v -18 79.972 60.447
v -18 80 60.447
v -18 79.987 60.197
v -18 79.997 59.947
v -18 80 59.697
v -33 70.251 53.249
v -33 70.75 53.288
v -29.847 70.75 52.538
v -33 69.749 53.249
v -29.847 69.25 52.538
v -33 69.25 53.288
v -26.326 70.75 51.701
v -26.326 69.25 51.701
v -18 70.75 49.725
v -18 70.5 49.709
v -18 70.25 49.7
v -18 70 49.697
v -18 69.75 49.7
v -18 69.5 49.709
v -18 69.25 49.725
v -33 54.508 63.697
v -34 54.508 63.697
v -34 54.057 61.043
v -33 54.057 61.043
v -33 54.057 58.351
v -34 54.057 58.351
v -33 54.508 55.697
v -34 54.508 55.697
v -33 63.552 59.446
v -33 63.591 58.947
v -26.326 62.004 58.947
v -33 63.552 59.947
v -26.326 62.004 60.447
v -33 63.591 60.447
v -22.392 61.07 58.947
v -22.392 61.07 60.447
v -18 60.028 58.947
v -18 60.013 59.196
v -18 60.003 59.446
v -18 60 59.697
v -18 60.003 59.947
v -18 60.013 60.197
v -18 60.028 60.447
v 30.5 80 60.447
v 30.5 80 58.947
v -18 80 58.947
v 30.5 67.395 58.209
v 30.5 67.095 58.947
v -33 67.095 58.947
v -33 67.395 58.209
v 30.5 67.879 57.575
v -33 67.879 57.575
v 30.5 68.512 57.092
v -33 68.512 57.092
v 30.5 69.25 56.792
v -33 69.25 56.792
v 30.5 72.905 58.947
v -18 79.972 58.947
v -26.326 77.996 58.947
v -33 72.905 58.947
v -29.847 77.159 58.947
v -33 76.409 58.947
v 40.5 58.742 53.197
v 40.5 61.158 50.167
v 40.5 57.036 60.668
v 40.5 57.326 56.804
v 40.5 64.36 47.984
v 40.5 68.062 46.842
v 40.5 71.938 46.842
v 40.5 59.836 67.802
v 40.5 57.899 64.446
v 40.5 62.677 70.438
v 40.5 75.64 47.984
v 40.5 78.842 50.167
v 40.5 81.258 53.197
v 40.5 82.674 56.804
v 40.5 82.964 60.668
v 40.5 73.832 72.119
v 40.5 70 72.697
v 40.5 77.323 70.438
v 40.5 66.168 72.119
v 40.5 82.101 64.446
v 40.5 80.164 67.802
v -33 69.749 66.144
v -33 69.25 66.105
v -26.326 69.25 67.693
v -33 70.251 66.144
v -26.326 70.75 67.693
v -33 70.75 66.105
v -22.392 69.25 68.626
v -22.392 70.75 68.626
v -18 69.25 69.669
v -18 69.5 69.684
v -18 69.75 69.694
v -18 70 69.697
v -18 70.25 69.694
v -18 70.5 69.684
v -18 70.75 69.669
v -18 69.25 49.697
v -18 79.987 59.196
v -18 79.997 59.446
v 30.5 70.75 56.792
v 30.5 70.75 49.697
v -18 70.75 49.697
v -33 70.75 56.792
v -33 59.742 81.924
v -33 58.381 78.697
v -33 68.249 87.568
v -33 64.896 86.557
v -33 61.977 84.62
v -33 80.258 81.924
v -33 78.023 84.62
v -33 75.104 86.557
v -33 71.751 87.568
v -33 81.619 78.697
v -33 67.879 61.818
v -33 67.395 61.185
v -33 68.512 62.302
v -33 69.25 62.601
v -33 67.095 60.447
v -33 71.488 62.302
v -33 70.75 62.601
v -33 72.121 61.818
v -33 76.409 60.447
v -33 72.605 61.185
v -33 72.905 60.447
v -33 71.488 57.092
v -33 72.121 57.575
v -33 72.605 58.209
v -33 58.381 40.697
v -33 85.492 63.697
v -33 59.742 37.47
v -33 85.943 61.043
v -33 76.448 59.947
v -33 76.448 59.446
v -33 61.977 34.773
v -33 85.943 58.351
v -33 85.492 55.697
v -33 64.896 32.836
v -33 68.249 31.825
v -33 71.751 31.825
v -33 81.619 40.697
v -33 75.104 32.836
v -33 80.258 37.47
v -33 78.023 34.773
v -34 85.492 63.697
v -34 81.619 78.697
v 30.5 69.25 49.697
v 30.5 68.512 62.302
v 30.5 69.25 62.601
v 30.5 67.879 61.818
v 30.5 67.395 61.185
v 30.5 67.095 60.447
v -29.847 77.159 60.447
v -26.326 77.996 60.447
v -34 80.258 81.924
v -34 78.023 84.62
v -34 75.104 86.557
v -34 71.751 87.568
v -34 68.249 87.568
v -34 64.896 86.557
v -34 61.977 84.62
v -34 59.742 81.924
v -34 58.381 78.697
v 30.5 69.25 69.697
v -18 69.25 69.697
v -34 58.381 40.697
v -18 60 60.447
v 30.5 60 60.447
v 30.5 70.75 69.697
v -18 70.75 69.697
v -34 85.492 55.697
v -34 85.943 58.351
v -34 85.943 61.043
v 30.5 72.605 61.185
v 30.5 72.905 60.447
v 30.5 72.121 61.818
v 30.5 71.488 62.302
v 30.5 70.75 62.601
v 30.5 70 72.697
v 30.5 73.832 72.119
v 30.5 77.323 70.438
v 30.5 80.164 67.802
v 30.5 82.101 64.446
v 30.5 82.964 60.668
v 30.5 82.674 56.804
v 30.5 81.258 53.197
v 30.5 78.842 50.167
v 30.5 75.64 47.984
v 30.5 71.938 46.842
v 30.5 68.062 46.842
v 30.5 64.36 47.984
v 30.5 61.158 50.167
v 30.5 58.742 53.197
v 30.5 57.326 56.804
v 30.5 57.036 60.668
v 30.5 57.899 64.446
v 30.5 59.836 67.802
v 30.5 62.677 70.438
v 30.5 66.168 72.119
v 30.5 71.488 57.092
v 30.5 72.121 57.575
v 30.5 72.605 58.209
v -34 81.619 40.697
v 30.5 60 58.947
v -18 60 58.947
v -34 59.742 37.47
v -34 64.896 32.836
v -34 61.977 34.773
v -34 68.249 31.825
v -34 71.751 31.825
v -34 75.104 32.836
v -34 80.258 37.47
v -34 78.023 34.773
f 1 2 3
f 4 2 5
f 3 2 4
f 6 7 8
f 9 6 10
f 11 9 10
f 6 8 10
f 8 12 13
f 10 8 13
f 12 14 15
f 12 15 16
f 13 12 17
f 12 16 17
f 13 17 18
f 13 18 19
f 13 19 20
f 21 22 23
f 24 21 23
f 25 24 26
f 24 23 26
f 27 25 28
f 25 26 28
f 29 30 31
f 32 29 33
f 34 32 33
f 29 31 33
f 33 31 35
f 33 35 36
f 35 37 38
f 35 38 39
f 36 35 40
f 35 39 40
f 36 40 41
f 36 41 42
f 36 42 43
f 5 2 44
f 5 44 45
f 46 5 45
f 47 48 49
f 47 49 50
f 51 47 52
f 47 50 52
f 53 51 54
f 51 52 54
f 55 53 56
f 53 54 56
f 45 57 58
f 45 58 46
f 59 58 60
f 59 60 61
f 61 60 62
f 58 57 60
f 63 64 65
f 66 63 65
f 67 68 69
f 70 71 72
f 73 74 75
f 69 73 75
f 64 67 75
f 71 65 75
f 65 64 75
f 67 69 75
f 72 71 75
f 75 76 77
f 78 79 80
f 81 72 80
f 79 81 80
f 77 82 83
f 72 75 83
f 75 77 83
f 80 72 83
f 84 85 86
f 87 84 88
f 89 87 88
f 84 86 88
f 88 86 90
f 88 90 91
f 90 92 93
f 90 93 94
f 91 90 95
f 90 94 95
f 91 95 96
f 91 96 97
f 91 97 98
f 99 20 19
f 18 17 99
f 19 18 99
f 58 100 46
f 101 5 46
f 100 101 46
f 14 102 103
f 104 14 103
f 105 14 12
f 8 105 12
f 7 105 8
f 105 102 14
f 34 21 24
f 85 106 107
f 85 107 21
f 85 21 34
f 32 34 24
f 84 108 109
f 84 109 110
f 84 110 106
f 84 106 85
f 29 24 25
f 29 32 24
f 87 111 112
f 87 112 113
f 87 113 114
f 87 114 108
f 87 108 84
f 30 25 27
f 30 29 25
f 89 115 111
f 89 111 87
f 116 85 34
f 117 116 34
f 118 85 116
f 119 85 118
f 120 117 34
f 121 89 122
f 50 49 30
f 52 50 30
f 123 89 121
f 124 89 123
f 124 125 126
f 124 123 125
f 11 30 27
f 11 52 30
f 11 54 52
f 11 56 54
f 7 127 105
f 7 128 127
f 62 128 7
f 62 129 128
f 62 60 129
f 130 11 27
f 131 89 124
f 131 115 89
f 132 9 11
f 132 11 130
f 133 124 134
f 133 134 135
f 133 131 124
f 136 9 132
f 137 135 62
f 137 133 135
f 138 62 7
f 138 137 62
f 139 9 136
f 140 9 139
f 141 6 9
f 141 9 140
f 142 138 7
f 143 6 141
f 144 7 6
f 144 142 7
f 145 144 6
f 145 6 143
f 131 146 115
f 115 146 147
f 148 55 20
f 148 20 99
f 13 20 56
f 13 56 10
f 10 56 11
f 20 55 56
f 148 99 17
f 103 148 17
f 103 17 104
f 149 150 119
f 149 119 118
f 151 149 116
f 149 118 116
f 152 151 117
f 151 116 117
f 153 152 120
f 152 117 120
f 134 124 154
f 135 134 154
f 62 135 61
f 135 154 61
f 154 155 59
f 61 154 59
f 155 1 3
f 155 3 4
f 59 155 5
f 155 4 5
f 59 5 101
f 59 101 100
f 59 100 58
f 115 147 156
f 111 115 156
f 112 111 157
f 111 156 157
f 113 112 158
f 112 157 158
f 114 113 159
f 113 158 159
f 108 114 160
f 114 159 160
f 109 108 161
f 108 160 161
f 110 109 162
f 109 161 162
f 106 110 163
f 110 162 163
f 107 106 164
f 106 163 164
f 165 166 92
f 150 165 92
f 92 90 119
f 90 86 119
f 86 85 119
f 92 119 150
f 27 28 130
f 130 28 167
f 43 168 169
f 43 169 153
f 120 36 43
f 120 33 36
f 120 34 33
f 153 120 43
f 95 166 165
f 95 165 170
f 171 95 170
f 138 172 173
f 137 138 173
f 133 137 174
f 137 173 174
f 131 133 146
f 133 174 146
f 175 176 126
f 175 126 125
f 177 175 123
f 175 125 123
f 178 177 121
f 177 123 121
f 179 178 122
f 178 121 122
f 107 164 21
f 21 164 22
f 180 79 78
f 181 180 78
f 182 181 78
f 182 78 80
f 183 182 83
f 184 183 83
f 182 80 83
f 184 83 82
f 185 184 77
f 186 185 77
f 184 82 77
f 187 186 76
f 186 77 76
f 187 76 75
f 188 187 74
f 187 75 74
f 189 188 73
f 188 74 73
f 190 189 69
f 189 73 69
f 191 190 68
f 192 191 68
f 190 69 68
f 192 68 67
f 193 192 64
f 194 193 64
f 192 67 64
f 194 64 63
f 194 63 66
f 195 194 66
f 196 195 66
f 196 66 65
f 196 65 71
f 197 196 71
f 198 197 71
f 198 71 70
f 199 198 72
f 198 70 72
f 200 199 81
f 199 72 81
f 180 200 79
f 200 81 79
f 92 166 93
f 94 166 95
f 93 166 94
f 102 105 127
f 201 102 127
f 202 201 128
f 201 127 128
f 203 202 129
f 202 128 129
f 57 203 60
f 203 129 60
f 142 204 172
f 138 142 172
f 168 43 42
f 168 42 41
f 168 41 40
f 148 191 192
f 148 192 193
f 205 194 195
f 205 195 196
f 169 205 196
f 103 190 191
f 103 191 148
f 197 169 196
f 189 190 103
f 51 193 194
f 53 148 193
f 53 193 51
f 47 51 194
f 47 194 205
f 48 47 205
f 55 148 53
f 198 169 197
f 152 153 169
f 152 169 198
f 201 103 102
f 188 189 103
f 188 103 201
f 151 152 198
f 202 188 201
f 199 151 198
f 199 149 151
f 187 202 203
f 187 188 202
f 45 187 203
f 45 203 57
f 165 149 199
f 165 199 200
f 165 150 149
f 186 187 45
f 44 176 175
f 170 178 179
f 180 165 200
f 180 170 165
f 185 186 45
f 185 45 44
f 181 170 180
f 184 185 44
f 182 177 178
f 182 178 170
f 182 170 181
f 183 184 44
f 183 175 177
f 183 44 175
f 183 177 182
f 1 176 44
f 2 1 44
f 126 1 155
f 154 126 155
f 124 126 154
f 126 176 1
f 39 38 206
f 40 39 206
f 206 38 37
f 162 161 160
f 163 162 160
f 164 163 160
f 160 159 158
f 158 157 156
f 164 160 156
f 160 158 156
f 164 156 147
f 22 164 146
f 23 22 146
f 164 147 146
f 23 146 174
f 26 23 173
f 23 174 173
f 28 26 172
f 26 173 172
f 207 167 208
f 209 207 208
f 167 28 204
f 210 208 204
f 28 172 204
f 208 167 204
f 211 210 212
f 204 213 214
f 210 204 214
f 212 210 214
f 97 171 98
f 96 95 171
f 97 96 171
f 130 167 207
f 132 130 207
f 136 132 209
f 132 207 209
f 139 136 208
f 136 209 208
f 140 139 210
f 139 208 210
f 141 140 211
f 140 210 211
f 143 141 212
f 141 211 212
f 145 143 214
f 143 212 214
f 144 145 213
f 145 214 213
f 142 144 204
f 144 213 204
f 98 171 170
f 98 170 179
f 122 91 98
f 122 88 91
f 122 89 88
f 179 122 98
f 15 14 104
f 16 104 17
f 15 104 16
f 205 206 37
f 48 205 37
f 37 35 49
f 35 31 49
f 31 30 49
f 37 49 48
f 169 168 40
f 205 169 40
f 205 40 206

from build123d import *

# Parameters (mm, degrees)
BOSS_EXTRUDE1_DEPTH      = 90
FILLET1_R                = 7.5
FILLET2_R                = 2
SKETCH2_W                = 20
SKETCH2_H                = 80
SKETCH2_W_2              = 32
BOSS_EXTRUDE2_DEPTH      = 20
SKETCH3_R                = 2.5
BOSS_EXTRUDE3_DEPTH      = 111
BOSS_EXTRUDE4_START      = 7.5
SKETCH4_W                = 80
SKETCH4_H                = 20
SKETCH4_R                = 3.25
BOSS_EXTRUDE4_DEPTH      = 20
MOVE_FACE1_BY            = 1.5
MOVE_FACE2_BY            = 1.5
FILLET3_R                = 4
FILLET4_R                = 4
CUT_EXTRUDE1_DEPTH       = 2
BOSS_EXTRUDE5_DEPTH      = 2
SKETCH7_W                = 58
SKETCH7_H                = 15
CUT_EXTRUDE2_DEPTH       = 0.5
SKETCH8_R                = 10
BOSS_EXTRUDE6_DEPTH      = 1.5
SKETCH10_R               = 4.25
SKETCH10_R_2             = 2.75
CUT_EXTRUDE_THIN1_DEPTH  = 1.5
SKETCH11_RX              = 5
SKETCH11_RY              = 2.5
BOSS_EXTRUDE7_DEPTH      = 1.5
LPATTERN1_COUNT          = 3
LPATTERN1_PITCH          = 24
SKETCH12_RX              = 5
SKETCH12_RY              = 2.5
BOSS_EXTRUDE8_DEPTH      = 1.5
LPATTERN2_START          = 113.13708499
LPATTERN2_DEPTH          = 1.5
FILLET7_R                = 7.5
FILLET5_R                = 5
FILLET6_R                = 2
SHELL1_T                 = -1
SKETCH14_R               = 14
BOSS_EXTRUDE9_DEPTH      = 1
BOSS_EXTRUDE10_DEPTH     = 1
BOSS_EXTRUDE11_START     = -30
BOSS_EXTRUDE11_OUTLINE_R = 13
BOSS_EXTRUDE11_DEPTH     = 10
BOSS_EXTRUDE12_REACH     = 233.484
SKETCH18_R               = 3
SKETCH17_W               = 1.5
SKETCH17_H               = 20
SKETCH17_W_2             = 20
SKETCH17_H_2             = 1.5
EXTRUDE_THIN1_DEPTH      = 63.5
SKETCH20_R               = 12.5
BOSS_EXTRUDE13_DEPTH     = 5
FILLET8_R                = 2


# Read off the part's stored shape, not the designer's step: LPattern2, Body-Move/Copy1, Boss-Extrude11
with BuildPart() as part:
    # Sketch1 → Boss-Extrude1 (new, symmetric)
    with BuildSketch(Plane(origin=(0, 0, 0), x_dir=(0, 0, -1), z_dir=(1, 0, 0))):
        Polygon((0, 0), (0, 45), (-115, 45), (-160, 0), align=None)
    extrude(amount=BOSS_EXTRUDE1_DEPTH, both=True)

    # Fillet1
    fillet1_edges = [part.edges().sort_by_distance(p)[0] for p in [
        (0, 0, 160),
        (0, 45, 115),
        (0, 45, 0),
        (0, 0, 0),
    ]]
    fillet(fillet1_edges, radius=FILLET1_R)

    # Fillet2
    fillet2_edges = [part.edges().sort_by_distance(p)[0] for p in [
        (-90, 0, 74.696699141),
        (90, 0, 74.696699141),
        (-90, 27.803300859, 132.196699141),
        (-90, 45, 59.696699141),
        (-90, 22.5, 0),
        (-90, 44.429096494, 114.763524025),
        (-90, 2.196699141, 2.196699141),
        (-90, 42.803300859, 2.196699141),
        (-90, 4.629874257, 148.822494776),
        (90, 27.803300859, 132.196699141),
        (90, 22.5, 0),
        (90, 45, 59.696699141),
        (90, 44.429096494, 114.763524025),
        (90, 2.196699141, 2.196699141),
        (90, 42.803300859, 2.196699141),
        (90, 4.629874257, 148.822494776),
    ]]
    fillet(fillet2_edges, radius=FILLET2_R)

    # Sketch2 → Boss-Extrude2 (add)
    with BuildSketch(Plane(origin=(0, 45, 0), x_dir=(1, 0, 0), z_dir=(0, 1, 0))):
        with Locations((-71.5, -59.696699141)):
            Rectangle(SKETCH2_W, SKETCH2_H)
        with Locations((65.5, -59.696699141)):
            Rectangle(SKETCH2_W_2, SKETCH2_H)
    extrude(amount=BOSS_EXTRUDE2_DEPTH)

    # Sketch3 → Boss-Extrude3 (add)
    with BuildSketch(Plane(origin=(-61.5, 0, 0), x_dir=(0, 0, -1), z_dir=(1, 0, 0))):
        with Locations(Location((-89.696699141, 59.5, 0), (0, 0, 180))):
            Circle(SKETCH3_R)
        with Locations(Location((-89.696699141, 50.5, 0), (0, 0, 180))):
            Circle(SKETCH3_R)
        with Locations(Location((-29.696699141, 50.5, 0), (0, 0, 180))):
            Circle(SKETCH3_R)
        with Locations(Location((-29.696699141, 59.5, 0), (0, 0, 180))):
            Circle(SKETCH3_R)
    extrude(amount=BOSS_EXTRUDE3_DEPTH)

    # Fillet3
    fillet3_edges = [part.edges().sort_by_distance(p)[0] for p in [
        (65.5, 65, 99.696699141),
        (65.5, 65, 19.696699141),
        (-71.5, 65, 99.696699141),
        (-71.5, 65, 19.696699141),
    ]]
    fillet(fillet3_edges, radius=FILLET3_R)

    # Sketch5 → Cut-Extrude1 (cut)
    with BuildSketch(Plane(origin=(0, 80, 80), x_dir=(1, 0, 0), z_dir=(0, 0.7071067811865511, 0.707106781186544))):
        with BuildLine():
            Line((-65, -56.317279836), (65, -56.317279836))
            ThreePointArc((65, -56.317279836), (66.767766953, -57.049512883), (67.5, -58.817279836))
            Line((67.5, -58.817279836), (67.5, -88.817279836))
            ThreePointArc((67.5, -88.817279836), (66.767766953, -90.585046789), (65, -91.317279836))
            Line((65, -91.317279836), (-65, -91.317279836))
            ThreePointArc((-65, -91.317279836), (-66.767766953, -90.585046789), (-67.5, -88.817279836))
            Line((-67.5, -88.817279836), (-67.5, -58.817279836))
            ThreePointArc((-67.5, -58.817279836), (-66.767766953, -57.049512883), (-65, -56.317279836))
        make_face()
    extrude(amount=-CUT_EXTRUDE1_DEPTH, mode=Mode.SUBTRACT)


with BuildPart() as body_2:
    # Sketch4 → Boss-Extrude4 (new body)
    with BuildSketch(Plane(origin=(-61.5, 0, 0), x_dir=(0, 0, -1), z_dir=(1, 0, 0)).offset(BOSS_EXTRUDE4_START)):
        with Locations((-59.696699141, 55)):
            Rectangle(SKETCH4_W, SKETCH4_H)
        with Locations((-89.696699141, 59.5)):
            Circle(SKETCH4_R, mode=Mode.SUBTRACT)
        with Locations((-89.696699141, 50.5)):
            Circle(SKETCH4_R, mode=Mode.SUBTRACT)
        with Locations((-29.696699141, 59.5)):
            Circle(SKETCH4_R, mode=Mode.SUBTRACT)
        with Locations((-29.696699141, 50.5)):
            Circle(SKETCH4_R, mode=Mode.SUBTRACT)
    extrude(amount=BOSS_EXTRUDE4_DEPTH)

    # Move Face1: a face moved outward by 1.5
    extrude(body_2.faces().sort_by_distance((-44, 65, 59.696699141))[0], amount=MOVE_FACE1_BY, dir=(0, 1, 0))

    # Move Face2: a face moved inward by 1.5
    extrude(body_2.faces().sort_by_distance((-44, 45, 59.696699141))[0], amount=MOVE_FACE2_BY, dir=(0, 1, 0), mode=Mode.SUBTRACT)

    # Fillet4
    fillet4_edges = [body_2.edges().sort_by_distance(p)[0] for p in [
        (-44, 66.5, 99.696699141),
        (-44, 66.5, 19.696699141),
        (-44, 46.5, 19.696699141),
        (-44, 46.5, 99.696699141),
    ]]
    fillet(fillet4_edges, radius=FILLET4_R)


with BuildPart() as body_3:
    # Sketch6 → Boss-Extrude5 (new body)
    with BuildSketch(Plane(origin=(0, 78.585786438, 78.585786438), x_dir=(1, 0, 0), z_dir=(0, 0.7071067811865509, 0.7071067811865441))):
        with BuildLine():
            Line((65, -56.317279836), (-65, -56.317279836))
            ThreePointArc((-65, -56.317279836), (-66.767766953, -57.049512883), (-67.5, -58.817279836))
            Line((-67.5, -58.817279836), (-67.5, -88.817279836))
            ThreePointArc((-67.5, -88.817279836), (-66.767766953, -90.585046789), (-65, -91.317279836))
            Line((-65, -91.317279836), (65, -91.317279836))
            ThreePointArc((65, -91.317279836), (66.767766953, -90.585046789), (67.5, -88.817279836))
            Line((67.5, -88.817279836), (67.5, -58.817279836))
            ThreePointArc((67.5, -58.817279836), (66.767766953, -57.049512883), (65, -56.317279836))
        make_face()
    extrude(amount=BOSS_EXTRUDE5_DEPTH)

    # Sketch7 → Cut-Extrude2 (cut)
    with BuildSketch(Plane(origin=(0, 80, 80), x_dir=(1, 0, 0), z_dir=(0, 0.7071067811865509, 0.7071067811865441))):
        with Locations((-28.5, -71.817279836)):
            Rectangle(SKETCH7_W, SKETCH7_H)
    extrude(amount=-CUT_EXTRUDE2_DEPTH, mode=Mode.SUBTRACT)

    # Sketch8 → Boss-Extrude6 (add)
    with BuildSketch(Plane(origin=(0, 80, 80), x_dir=(1, 0, 0), z_dir=(0, 0.7071067811865509, 0.7071067811865441))):
        with Locations(Location((15.5, -71.817279836, 0), (0, 0, 270))):
            Circle(SKETCH8_R)
    extrude(amount=BOSS_EXTRUDE6_DEPTH)

    # Sketch10 → Cut-Extrude-Thin1 (cut)
    # profile 1 of 5: a face of its own
    with BuildSketch(Plane(origin=(0, 81.060660172, 81.060660172), x_dir=(1, 0, 0), z_dir=(0, 0.7071067811865509, 0.7071067811865441))):
        with Locations((15.5, -71.817279836)):
            Circle(SKETCH10_R)
        with Locations((15.5, -71.817279836)):
            Circle(SKETCH10_R_2, mode=Mode.SUBTRACT)
    # profile 2 of 5: a face of its own
    with BuildSketch(Plane(origin=(0, 81.060660172, 81.060660172), x_dir=(1, 0, 0), z_dir=(0, 0.7071067811865509, 0.7071067811865441))):
        Polygon((7.898602102, -65.27654211), (12.49479618, -69.872736188), (13.555456352, -68.812076016), (8.959262274, -64.215881939), align=None)
    # profile 3 of 5: a face of its own
    with BuildSketch(Plane(origin=(0, 81.060660172, 81.060660172), x_dir=(1, 0, 0), z_dir=(0, 0.7071067811865509, 0.7071067811865441))):
        Polygon((22.040737726, -64.215881939), (17.444543648, -68.812076016), (18.50520382, -69.872736188), (23.101397898, -65.27654211), align=None)
    # profile 4 of 5: a face of its own
    with BuildSketch(Plane(origin=(0, 81.060660172, 81.060660172), x_dir=(1, 0, 0), z_dir=(0, 0.7071067811865509, 0.7071067811865441))):
        Polygon((17.444543648, -74.822483656), (22.040737726, -79.418677734), (23.101397898, -78.358017562), (18.50520382, -73.761823485), align=None)
    # profile 5 of 5: a face of its own
    with BuildSketch(Plane(origin=(0, 81.060660172, 81.060660172), x_dir=(1, 0, 0), z_dir=(0, 0.7071067811865509, 0.7071067811865441))):
        Polygon((12.49479618, -73.761823485), (7.898602102, -78.358017562), (8.959262274, -79.418677734), (13.555456352, -74.822483656), align=None)
    extrude(amount=-CUT_EXTRUDE_THIN1_DEPTH, mode=Mode.SUBTRACT)

    # Sketch11 → Boss-Extrude7 (add)
    with BuildSketch(Plane(origin=(0, 80, 80), x_dir=(1, 0, 0), z_dir=(0, 0.7071067811865509, 0.7071067811865441))):
        with Locations((-52.5, -85.317279836)):
            Ellipse(SKETCH11_RX, SKETCH11_RY)
    boss_extrude7 = extrude(amount=BOSS_EXTRUDE7_DEPTH)

    # LPattern1: Boss-Extrude7 ×3
    with Locations(*[(i * LPATTERN1_PITCH, 0, 0) for i in range(1, LPATTERN1_COUNT)]):
        add(boss_extrude7)

    # Sketch12 → Boss-Extrude8 (add)
    with BuildSketch(Plane(origin=(0, 80, 80), x_dir=(1, 0, 0), z_dir=(0, 0.7071067811865509, 0.7071067811865441))):
        with Locations((32.5, -66.317279836)):
            Ellipse(SKETCH12_RX, SKETCH12_RY)
    extrude(amount=BOSS_EXTRUDE8_DEPTH)

    # LPattern2 outline → LPattern2 (add)
    with BuildSketch(Plane(origin=(0, 0, 0), x_dir=(1, 0, 0), z_dir=(0, 0.707106781186551, 0.7071067811865439)).offset(LPATTERN2_START)):
        with BuildLine():
            add(Edge.make_bspline(
                [(37.5, -74.317279836), (37.5, -69.987152818), (30, -72.152216327), (22.5, -74.317279836), (30, -76.482343346), (37.5, -78.647406855), (37.5, -74.317279836)],
                knots=[0, 0, 0, 2.094395102, 2.094395102, 4.188790205, 4.188790205, 6.283185307, 6.283185307, 6.283185307], degree=2, weights=[1, 0.5, 1, 0.5, 1, 0.5, 1]))
        make_face()
        with BuildLine():
            add(Edge.make_bspline(
                [(37.5, -82.317279836), (37.5, -77.987152818), (30, -80.152216327), (22.5, -82.317279836), (30, -84.482343346), (37.5, -86.647406855), (37.5, -82.317279836)],
                knots=[0, 0, 0, 2.094395102, 2.094395102, 4.188790205, 4.188790205, 6.283185307, 6.283185307, 6.283185307], degree=2, weights=[1, 0.5, 1, 0.5, 1, 0.5, 1]))
        make_face()
        with BuildLine():
            add(Edge.make_bspline(
                [(49.5, -66.317279836), (49.5, -61.987152818), (42, -64.152216327), (34.5, -66.317279836), (42, -68.482343346), (49.5, -70.647406855), (49.5, -66.317279836)],
                knots=[0, 0, 0, 2.094395102, 2.094395102, 4.188790205, 4.188790205, 6.283185307, 6.283185307, 6.283185307], degree=2, weights=[1, 0.5, 1, 0.5, 1, 0.5, 1]))
        make_face()
        with BuildLine():
            add(Edge.make_bspline(
                [(49.5, -74.317279836), (49.5, -69.987152818), (42, -72.152216327), (34.5, -74.317279836), (42, -76.482343346), (49.5, -78.647406855), (49.5, -74.317279836)],
                knots=[0, 0, 0, 2.094395102, 2.094395102, 4.188790205, 4.188790205, 6.283185307, 6.283185307, 6.283185307], degree=2, weights=[1, 0.5, 1, 0.5, 1, 0.5, 1]))
        make_face()
        with BuildLine():
            add(Edge.make_bspline(
                [(49.5, -82.317279836), (49.5, -77.987152818), (42, -80.152216327), (34.5, -82.317279836), (42, -84.482343346), (49.5, -86.647406855), (49.5, -82.317279836)],
                knots=[0, 0, 0, 2.094395102, 2.094395102, 4.188790205, 4.188790205, 6.283185307, 6.283185307, 6.283185307], degree=2, weights=[1, 0.5, 1, 0.5, 1, 0.5, 1]))
        make_face()
        with BuildLine():
            add(Edge.make_bspline(
                [(61.5, -66.317279836), (61.5, -61.987152818), (54, -64.152216327), (46.5, -66.317279836), (54, -68.482343346), (61.5, -70.647406855), (61.5, -66.317279836)],
                knots=[0, 0, 0, 2.094395102, 2.094395102, 4.188790205, 4.188790205, 6.283185307, 6.283185307, 6.283185307], degree=2, weights=[1, 0.5, 1, 0.5, 1, 0.5, 1]))
        make_face()
        with BuildLine():
            add(Edge.make_bspline(
                [(61.5, -74.317279836), (61.5, -69.987152818), (54, -72.152216327), (46.5, -74.317279836), (54, -76.482343346), (61.5, -78.647406855), (61.5, -74.317279836)],
                knots=[0, 0, 0, 2.094395102, 2.094395102, 4.188790205, 4.188790205, 6.283185307, 6.283185307, 6.283185307], degree=2, weights=[1, 0.5, 1, 0.5, 1, 0.5, 1]))
        make_face()
        with BuildLine():
            add(Edge.make_bspline(
                [(61.5, -82.317279836), (61.5, -77.987152818), (54, -80.152216327), (46.5, -82.317279836), (54, -84.482343346), (61.5, -86.647406855), (61.5, -82.317279836)],
                knots=[0, 0, 0, 2.094395102, 2.094395102, 4.188790205, 4.188790205, 6.283185307, 6.283185307, 6.283185307], degree=2, weights=[1, 0.5, 1, 0.5, 1, 0.5, 1]))
        make_face()
    extrude(amount=LPATTERN2_DEPTH)


with BuildPart() as body_4:
    # Sketch13 → Revolve1 (revolve)
    with BuildSketch(Plane.XY.offset(59.696699141), mode=Mode.PRIVATE) as revolve1_sk:
        Polygon((11.5, 70), (11.5, 85), (105.301145933, 85), (111.5, 74.263269807), (121.5, 72.5), (121.5, 70), align=None)
    revolve(revolve1_sk.sketch.rotate(Axis((11.5, 70, 59.696699141), (1, 0, 0)), 90), axis=Axis((11.5, 70, 59.696699141), (1, 0, 0)))

    # Fillet5
    fillet5_edges = [body_4.edges().sort_by_distance(p)[0] for p in [
        (105.301145933, 70, 44.696699141),
    ]]
    fillet(fillet5_edges, radius=FILLET5_R)

    # Fillet6
    fillet6_edges = [body_4.edges().sort_by_distance(p)[0] for p in [
        (111.5, 70, 55.433429334),
    ]]
    fillet(fillet6_edges, radius=FILLET6_R)

    # Shell1
    shell1_openings = [body_4.faces().sort_by_distance(p)[0] for p in [
        (121.5, 70, 59.696699141),
        (11.5, 70, 59.696699141),
    ]]
    offset(amount=SHELL1_T, openings=shell1_openings, kind=Kind.INTERSECTION)

    # Sketch14 → Boss-Extrude9 (add)
    with BuildSketch(Plane.ZY.offset(-11.5)):
        with BuildLine():
            Line((55.696699141, 85.491933385), (40.696699141, 81.618950039))
            ThreePointArc((40.696699141, 81.618950039), (31.696699141, 70), (40.696699141, 58.381049961))
            Line((40.696699141, 58.381049961), (55.696699141, 54.508066615))
            ThreePointArc((55.696699141, 54.508066615), (59.696699141, 54), (63.696699141, 54.508066615))
            Line((63.696699141, 54.508066615), (78.696699141, 58.381049961))
            ThreePointArc((78.696699141, 58.381049961), (87.696699141, 70), (78.696699141, 81.618950039))
            Line((78.696699141, 81.618950039), (63.696699141, 85.491933385))
            ThreePointArc((63.696699141, 85.491933385), (59.696699141, 86), (55.696699141, 85.491933385))
        make_face()
        with Locations((59.696699141, 70)):
            Circle(SKETCH14_R, mode=Mode.SUBTRACT)
    extrude(amount=BOSS_EXTRUDE9_DEPTH)


with BuildPart() as body_5:
    # Body-Move/Copy1 outline → Body-Move/Copy1 (revolve)
    with BuildSketch(Plane(origin=(0, 70, 59.696699141), x_dir=(0, 1, 0), z_dir=(0, 0, -1))):
        Polygon((0, 121.5), (0, 11.5), (15, 11.5), (15, 105.301145933), (4.263269807, 111.5), (2.5, 121.5), align=None)
    revolve(axis=Axis((0, 70, 59.696699141), (1, 0, 0)))


with BuildPart() as part_1:
    add(part.part)

    # Combine1: cut body 5
    add(body_5.part, mode=Mode.SUBTRACT)

    # Fillet7
    fillet7_edges = [part_1.edges().sort_by_distance(p)[0] for p in [
        (65.5, 65, 73.838834765),
        (65.5, 65, 45.554563517),
    ]]
    fillet(fillet7_edges, radius=FILLET7_R)

    # Sketch20 → Boss-Extrude13 (add)
    with BuildSketch(Plane.XZ):
        with Locations(Location((-60, 116.893398282, 0), (0, 0, 90))):
            Circle(SKETCH20_R)
        with Locations(Location((-60, 32.5, 0), (0, 0, 90))):
            Circle(SKETCH20_R)
        with Locations(Location((60, 32.5, 0), (0, 0, 90))):
            Circle(SKETCH20_R)
        with Locations(Location((60, 116.893398282, 0), (0, 0, 90))):
            Circle(SKETCH20_R)
    extrude(amount=BOSS_EXTRUDE13_DEPTH)

    # Fillet8
    fillet8_edges = [part_1.edges().sort_by_distance(p)[0] for p in [
        (-60, -5, 104.393398282),
        (-60, -5, 20),
        (60, -5, 20),
        (60, -5, 104.393398282),
    ]]
    fillet(fillet8_edges, radius=FILLET8_R)


with BuildPart() as body_5_2:
    # Sketch15 → Boss-Extrude10 (new body)
    with BuildSketch(Plane(origin=(-34, 0, 0), x_dir=(0, 0, -1), z_dir=(1, 0, 0))):
        with BuildLine():
            Line((-63.696699141, 85.491933385), (-78.696699141, 81.618950039))
            ThreePointArc((-78.696699141, 81.618950039), (-87.696699141, 70), (-78.696699141, 58.381049961))
            Line((-78.696699141, 58.381049961), (-63.696699141, 54.508066615))
            ThreePointArc((-63.696699141, 54.508066615), (-59.696699141, 54), (-55.696699141, 54.508066615))
            Line((-55.696699141, 54.508066615), (-40.696699141, 58.381049961))
            ThreePointArc((-40.696699141, 58.381049961), (-31.696699141, 70), (-40.696699141, 81.618950039))
            Line((-40.696699141, 81.618950039), (-55.696699141, 85.491933385))
            ThreePointArc((-55.696699141, 85.491933385), (-59.696699141, 86), (-63.696699141, 85.491933385))
        make_face()
    extrude(amount=BOSS_EXTRUDE10_DEPTH)


with BuildPart() as body_6:
    # Boss-Extrude11 outline → Boss-Extrude11 (new body)
    with BuildSketch(Plane.ZY.offset(-10.5).offset(BOSS_EXTRUDE11_START)):
        with Locations((59.696699141, 70)):
            Circle(BOSS_EXTRUDE11_OUTLINE_R)
    extrude(amount=BOSS_EXTRUDE11_DEPTH)

    # Sketch18 → Boss-Extrude12 (add, up to next)
    with BuildSketch(Plane(origin=(-33, 0, 0), x_dir=(0, 0, -1), z_dir=(1, 0, 0)), mode=Mode.PRIVATE) as boss_extrude12_sk1:
        with Locations(Location((-59.696699141, 70, 0), (0, 0, 180))):
            Circle(SKETCH18_R)
    boss_extrude12_tool1 = extrude(boss_extrude12_sk1.sketch, amount=BOSS_EXTRUDE12_REACH, mode=Mode.PRIVATE) - body_6.part

    add(body_5_2.part)  # Boss-Extrude12 merges body 5 2
    add(boss_extrude12_tool1.solids().sort_by_distance((-33, 70, 59.696699))[0])

    # Sketch17 → Extrude-Thin1 (add)
    with BuildSketch(Plane(origin=(-33, 0, 0), x_dir=(0, 0, -1), z_dir=(1, 0, 0))):
        with Locations((-59.696699141, 70)):
            Rectangle(SKETCH17_W, SKETCH17_H)
        with Locations((-59.696699141, 70)):
            Rectangle(SKETCH17_W_2, SKETCH17_H_2)
    extrude(amount=EXTRUDE_THIN1_DEPTH)

    # Sketch19 → Cut-Revolve3 (revolve, cut)
    with BuildSketch(Plane.XY.offset(59.696699141), mode=Mode.PRIVATE) as cut_revolve3_sk:
        Polygon((-33, 76.452368755), (-18, 80), (-18, 81.618950039), (-33, 81.618950039), align=None)
    revolve(cut_revolve3_sk.sketch.rotate(Axis((111.5, 70, 59.696699141), (-1, 0, 0)), 270), axis=Axis((111.5, 70, 59.696699141), (-1, 0, 0)), mode=Mode.SUBTRACT)


solid = body_6.part
